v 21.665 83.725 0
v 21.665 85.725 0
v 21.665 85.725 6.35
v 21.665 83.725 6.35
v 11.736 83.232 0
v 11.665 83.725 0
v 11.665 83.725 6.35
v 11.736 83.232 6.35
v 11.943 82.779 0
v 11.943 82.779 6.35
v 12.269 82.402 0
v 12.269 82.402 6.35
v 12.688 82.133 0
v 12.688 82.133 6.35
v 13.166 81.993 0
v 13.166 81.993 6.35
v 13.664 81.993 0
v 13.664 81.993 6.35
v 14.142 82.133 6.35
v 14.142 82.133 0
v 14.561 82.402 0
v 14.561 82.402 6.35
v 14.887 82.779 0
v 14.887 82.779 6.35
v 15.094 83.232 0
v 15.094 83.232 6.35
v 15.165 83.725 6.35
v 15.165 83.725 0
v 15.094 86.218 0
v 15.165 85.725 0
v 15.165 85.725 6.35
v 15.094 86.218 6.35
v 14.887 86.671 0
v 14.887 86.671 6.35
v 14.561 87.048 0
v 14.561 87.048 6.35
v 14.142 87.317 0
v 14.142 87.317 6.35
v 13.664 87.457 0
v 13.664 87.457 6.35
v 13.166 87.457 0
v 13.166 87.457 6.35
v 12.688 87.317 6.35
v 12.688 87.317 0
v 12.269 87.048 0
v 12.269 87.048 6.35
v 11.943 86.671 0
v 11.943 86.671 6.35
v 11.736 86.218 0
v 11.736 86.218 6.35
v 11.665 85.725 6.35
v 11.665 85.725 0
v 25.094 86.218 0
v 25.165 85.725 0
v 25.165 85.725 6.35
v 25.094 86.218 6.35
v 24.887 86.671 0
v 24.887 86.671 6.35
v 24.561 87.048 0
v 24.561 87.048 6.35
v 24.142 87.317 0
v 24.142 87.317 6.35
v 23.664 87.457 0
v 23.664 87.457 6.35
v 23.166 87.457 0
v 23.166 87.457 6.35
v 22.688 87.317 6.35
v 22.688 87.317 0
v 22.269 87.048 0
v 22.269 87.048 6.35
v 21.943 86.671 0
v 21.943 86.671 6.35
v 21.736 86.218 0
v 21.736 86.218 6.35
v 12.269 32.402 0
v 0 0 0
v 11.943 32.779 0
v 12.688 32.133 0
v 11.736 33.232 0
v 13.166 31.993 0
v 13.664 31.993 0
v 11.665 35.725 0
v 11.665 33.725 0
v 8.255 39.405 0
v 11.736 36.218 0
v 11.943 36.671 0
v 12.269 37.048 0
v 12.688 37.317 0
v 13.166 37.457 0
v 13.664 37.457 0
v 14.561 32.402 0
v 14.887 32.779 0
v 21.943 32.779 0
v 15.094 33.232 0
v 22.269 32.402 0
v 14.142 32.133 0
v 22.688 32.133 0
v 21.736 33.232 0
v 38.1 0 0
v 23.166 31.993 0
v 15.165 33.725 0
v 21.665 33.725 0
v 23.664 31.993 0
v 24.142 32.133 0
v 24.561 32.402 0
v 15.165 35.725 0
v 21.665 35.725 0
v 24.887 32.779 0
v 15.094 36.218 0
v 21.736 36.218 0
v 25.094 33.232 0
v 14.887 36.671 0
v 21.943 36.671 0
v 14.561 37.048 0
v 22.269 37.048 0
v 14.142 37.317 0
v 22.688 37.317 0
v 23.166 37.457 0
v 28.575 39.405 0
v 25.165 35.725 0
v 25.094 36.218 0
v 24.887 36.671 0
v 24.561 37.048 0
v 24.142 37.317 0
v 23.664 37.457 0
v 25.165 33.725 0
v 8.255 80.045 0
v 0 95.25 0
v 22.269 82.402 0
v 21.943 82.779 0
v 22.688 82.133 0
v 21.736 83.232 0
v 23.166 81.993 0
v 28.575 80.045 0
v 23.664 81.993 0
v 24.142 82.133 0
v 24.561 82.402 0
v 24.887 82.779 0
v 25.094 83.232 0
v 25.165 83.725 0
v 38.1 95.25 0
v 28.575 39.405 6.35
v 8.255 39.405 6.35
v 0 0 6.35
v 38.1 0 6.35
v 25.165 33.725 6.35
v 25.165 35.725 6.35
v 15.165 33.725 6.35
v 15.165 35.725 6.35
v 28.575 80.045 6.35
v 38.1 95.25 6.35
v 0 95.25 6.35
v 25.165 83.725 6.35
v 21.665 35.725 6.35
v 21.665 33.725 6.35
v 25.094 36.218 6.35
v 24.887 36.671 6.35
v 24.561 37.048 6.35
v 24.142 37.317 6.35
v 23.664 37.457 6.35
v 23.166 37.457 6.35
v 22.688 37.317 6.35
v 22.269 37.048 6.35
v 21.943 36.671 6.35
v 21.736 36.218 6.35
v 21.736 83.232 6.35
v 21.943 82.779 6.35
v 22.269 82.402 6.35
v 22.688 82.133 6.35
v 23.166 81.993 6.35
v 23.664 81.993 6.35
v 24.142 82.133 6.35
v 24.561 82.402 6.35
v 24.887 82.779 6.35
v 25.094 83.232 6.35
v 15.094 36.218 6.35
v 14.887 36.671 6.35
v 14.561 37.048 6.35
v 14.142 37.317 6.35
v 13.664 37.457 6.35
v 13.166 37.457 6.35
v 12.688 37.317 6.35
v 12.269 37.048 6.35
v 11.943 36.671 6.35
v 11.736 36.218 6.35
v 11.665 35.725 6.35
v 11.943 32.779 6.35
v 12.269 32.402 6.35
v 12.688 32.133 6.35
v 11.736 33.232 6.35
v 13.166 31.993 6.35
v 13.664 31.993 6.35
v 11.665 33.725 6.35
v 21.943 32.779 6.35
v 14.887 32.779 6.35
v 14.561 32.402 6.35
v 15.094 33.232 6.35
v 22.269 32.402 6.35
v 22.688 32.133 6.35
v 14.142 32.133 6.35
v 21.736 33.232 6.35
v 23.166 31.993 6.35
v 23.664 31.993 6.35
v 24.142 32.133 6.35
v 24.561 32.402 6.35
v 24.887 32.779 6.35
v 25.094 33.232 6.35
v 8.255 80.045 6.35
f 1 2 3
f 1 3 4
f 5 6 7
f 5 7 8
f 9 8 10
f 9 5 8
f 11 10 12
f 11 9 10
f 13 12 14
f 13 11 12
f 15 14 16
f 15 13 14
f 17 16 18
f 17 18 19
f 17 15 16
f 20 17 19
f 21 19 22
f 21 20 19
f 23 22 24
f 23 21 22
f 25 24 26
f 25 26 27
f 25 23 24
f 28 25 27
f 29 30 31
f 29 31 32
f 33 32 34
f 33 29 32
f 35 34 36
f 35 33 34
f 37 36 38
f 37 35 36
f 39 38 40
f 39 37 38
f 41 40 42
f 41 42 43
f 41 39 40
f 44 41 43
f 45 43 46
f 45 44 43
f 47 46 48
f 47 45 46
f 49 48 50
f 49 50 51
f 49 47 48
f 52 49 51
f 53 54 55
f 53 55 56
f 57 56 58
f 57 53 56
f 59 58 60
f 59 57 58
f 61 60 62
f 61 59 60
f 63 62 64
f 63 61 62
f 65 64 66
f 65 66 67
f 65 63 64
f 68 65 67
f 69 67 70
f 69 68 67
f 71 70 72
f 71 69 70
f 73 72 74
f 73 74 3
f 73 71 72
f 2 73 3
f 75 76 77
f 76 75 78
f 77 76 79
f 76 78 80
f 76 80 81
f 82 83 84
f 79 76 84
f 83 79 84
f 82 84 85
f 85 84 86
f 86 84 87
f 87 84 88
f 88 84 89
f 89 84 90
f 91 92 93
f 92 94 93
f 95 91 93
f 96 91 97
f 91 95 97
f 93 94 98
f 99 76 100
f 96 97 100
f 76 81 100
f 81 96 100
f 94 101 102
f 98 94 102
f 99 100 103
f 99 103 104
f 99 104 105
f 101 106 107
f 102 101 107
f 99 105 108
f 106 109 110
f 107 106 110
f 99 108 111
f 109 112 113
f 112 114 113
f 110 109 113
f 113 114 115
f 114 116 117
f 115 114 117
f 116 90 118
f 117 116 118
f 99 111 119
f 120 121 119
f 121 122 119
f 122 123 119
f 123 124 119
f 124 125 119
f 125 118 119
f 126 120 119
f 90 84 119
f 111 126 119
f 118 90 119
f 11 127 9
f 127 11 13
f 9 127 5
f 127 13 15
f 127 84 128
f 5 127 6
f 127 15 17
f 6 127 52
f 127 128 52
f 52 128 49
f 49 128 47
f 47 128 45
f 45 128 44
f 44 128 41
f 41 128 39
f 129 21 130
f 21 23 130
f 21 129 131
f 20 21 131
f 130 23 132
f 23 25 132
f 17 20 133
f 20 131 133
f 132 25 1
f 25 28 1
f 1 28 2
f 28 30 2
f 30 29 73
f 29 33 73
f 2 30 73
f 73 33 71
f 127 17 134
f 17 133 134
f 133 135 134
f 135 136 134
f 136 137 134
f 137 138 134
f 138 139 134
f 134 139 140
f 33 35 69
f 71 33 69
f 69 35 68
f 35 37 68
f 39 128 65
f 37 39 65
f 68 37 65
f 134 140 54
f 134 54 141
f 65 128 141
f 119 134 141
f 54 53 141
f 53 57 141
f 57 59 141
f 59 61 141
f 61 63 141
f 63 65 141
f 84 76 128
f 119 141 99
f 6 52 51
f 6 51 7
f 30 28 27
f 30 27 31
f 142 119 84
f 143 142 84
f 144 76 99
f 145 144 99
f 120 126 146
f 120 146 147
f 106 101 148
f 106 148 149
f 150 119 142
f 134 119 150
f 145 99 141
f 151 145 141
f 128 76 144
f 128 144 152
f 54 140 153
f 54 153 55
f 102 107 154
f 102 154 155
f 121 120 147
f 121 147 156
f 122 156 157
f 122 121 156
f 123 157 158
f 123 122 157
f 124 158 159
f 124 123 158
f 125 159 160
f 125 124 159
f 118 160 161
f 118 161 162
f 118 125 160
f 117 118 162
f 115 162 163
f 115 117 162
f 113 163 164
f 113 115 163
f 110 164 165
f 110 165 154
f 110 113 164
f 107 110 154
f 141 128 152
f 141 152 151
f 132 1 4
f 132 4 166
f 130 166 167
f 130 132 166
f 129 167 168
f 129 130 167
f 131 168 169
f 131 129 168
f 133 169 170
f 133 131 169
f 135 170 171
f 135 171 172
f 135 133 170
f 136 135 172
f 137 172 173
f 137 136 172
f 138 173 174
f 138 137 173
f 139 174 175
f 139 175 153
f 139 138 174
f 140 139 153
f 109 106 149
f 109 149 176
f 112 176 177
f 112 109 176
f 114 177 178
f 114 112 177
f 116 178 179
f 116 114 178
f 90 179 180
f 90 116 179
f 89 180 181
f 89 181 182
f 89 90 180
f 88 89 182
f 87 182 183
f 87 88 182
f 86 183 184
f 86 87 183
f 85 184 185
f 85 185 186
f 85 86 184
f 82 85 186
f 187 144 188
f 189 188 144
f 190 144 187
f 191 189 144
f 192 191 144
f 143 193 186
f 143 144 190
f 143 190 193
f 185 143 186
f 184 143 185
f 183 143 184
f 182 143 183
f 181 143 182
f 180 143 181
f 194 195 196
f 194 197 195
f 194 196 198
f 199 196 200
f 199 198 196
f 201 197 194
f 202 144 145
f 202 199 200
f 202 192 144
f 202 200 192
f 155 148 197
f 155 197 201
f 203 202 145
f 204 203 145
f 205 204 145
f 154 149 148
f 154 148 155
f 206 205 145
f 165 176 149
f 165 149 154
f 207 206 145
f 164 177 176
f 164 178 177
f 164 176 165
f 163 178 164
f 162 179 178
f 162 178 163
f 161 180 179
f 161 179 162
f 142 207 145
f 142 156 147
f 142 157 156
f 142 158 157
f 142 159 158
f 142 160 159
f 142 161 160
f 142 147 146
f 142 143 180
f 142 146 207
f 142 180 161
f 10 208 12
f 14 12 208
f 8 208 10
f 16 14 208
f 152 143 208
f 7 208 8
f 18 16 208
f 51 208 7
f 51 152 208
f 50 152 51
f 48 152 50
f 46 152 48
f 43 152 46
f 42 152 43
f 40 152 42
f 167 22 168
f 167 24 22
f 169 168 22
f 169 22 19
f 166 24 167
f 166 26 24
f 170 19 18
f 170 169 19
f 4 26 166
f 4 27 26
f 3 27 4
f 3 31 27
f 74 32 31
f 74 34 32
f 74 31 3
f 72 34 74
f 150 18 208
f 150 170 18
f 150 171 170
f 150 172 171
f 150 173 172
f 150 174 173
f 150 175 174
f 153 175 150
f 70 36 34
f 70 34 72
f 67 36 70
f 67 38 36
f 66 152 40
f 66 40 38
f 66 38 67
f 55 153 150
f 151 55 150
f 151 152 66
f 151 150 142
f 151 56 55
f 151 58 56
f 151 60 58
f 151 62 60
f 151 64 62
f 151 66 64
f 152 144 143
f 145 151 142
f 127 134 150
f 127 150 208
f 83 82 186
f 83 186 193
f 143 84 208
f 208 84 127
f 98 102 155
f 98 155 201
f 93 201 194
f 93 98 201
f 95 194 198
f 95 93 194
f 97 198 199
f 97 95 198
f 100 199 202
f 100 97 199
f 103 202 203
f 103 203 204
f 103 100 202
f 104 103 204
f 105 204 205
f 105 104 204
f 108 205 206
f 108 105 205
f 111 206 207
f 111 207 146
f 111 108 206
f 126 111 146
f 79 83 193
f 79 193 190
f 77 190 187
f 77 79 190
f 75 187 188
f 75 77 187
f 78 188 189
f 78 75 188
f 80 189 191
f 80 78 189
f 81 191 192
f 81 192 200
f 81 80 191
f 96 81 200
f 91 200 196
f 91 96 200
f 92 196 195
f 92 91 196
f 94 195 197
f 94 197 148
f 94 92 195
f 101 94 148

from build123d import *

# Parameters (mm, degrees)
SKETCH1_W           = 38.1
SKETCH1_H           = 95.25
BOSS_EXTRUDE1_DEPTH = 6.35
SKETCH2_W           = 20.32
SKETCH2_H           = 40.64
CUT_EXTRUDE1_DEPTH  = 6.35


with BuildPart() as part:
    # Sketch1 → Boss-Extrude1 (new body)
    with BuildSketch(Plane.XY):
        with Locations((19.05, 47.625)):
            Rectangle(SKETCH1_W, SKETCH1_H)
    extrude(amount=BOSS_EXTRUDE1_DEPTH)

    # Sketch2 → Cut-Extrude1 (cut)
    with BuildSketch(Plane(origin=(0, 0, 0), x_dir=(-1, 0, 0), z_dir=(0, 0, -1))):
        with Locations((-18.415, 59.725)):
            Rectangle(SKETCH2_W, SKETCH2_H)
        with BuildLine():
            Line((-25.165, 83.725), (-25.165, 85.725))
            ThreePointArc((-25.165, 85.725), (-23.415, 87.475), (-21.665, 85.725))
            Line((-21.665, 85.725), (-21.665, 83.725))
            ThreePointArc((-21.665, 83.725), (-23.415, 81.975), (-25.165, 83.725))
        make_face()
        with BuildLine():
            Line((-15.165, 83.725), (-15.165, 85.725))
            ThreePointArc((-15.165, 85.725), (-13.415, 87.475), (-11.665, 85.725))
            Line((-11.665, 85.725), (-11.665, 83.725))
            ThreePointArc((-11.665, 83.725), (-13.415, 81.975), (-15.165, 83.725))
        make_face()
        with BuildLine():
            Line((-21.665, 35.725), (-21.665, 33.725))
            ThreePointArc((-21.665, 33.725), (-23.415, 31.975), (-25.165, 33.725))
            Line((-25.165, 33.725), (-25.165, 35.725))
            ThreePointArc((-25.165, 35.725), (-23.415, 37.475), (-21.665, 35.725))
        make_face()
        with BuildLine():
            Line((-11.665, 35.725), (-11.665, 33.725))
            ThreePointArc((-11.665, 33.725), (-13.415, 31.975), (-15.165, 33.725))
            Line((-15.165, 33.725), (-15.165, 35.725))
            ThreePointArc((-15.165, 35.725), (-13.415, 37.475), (-11.665, 35.725))
        make_face()
    extrude(amount=-CUT_EXTRUDE1_DEPTH, mode=Mode.SUBTRACT)


solid = part.part
